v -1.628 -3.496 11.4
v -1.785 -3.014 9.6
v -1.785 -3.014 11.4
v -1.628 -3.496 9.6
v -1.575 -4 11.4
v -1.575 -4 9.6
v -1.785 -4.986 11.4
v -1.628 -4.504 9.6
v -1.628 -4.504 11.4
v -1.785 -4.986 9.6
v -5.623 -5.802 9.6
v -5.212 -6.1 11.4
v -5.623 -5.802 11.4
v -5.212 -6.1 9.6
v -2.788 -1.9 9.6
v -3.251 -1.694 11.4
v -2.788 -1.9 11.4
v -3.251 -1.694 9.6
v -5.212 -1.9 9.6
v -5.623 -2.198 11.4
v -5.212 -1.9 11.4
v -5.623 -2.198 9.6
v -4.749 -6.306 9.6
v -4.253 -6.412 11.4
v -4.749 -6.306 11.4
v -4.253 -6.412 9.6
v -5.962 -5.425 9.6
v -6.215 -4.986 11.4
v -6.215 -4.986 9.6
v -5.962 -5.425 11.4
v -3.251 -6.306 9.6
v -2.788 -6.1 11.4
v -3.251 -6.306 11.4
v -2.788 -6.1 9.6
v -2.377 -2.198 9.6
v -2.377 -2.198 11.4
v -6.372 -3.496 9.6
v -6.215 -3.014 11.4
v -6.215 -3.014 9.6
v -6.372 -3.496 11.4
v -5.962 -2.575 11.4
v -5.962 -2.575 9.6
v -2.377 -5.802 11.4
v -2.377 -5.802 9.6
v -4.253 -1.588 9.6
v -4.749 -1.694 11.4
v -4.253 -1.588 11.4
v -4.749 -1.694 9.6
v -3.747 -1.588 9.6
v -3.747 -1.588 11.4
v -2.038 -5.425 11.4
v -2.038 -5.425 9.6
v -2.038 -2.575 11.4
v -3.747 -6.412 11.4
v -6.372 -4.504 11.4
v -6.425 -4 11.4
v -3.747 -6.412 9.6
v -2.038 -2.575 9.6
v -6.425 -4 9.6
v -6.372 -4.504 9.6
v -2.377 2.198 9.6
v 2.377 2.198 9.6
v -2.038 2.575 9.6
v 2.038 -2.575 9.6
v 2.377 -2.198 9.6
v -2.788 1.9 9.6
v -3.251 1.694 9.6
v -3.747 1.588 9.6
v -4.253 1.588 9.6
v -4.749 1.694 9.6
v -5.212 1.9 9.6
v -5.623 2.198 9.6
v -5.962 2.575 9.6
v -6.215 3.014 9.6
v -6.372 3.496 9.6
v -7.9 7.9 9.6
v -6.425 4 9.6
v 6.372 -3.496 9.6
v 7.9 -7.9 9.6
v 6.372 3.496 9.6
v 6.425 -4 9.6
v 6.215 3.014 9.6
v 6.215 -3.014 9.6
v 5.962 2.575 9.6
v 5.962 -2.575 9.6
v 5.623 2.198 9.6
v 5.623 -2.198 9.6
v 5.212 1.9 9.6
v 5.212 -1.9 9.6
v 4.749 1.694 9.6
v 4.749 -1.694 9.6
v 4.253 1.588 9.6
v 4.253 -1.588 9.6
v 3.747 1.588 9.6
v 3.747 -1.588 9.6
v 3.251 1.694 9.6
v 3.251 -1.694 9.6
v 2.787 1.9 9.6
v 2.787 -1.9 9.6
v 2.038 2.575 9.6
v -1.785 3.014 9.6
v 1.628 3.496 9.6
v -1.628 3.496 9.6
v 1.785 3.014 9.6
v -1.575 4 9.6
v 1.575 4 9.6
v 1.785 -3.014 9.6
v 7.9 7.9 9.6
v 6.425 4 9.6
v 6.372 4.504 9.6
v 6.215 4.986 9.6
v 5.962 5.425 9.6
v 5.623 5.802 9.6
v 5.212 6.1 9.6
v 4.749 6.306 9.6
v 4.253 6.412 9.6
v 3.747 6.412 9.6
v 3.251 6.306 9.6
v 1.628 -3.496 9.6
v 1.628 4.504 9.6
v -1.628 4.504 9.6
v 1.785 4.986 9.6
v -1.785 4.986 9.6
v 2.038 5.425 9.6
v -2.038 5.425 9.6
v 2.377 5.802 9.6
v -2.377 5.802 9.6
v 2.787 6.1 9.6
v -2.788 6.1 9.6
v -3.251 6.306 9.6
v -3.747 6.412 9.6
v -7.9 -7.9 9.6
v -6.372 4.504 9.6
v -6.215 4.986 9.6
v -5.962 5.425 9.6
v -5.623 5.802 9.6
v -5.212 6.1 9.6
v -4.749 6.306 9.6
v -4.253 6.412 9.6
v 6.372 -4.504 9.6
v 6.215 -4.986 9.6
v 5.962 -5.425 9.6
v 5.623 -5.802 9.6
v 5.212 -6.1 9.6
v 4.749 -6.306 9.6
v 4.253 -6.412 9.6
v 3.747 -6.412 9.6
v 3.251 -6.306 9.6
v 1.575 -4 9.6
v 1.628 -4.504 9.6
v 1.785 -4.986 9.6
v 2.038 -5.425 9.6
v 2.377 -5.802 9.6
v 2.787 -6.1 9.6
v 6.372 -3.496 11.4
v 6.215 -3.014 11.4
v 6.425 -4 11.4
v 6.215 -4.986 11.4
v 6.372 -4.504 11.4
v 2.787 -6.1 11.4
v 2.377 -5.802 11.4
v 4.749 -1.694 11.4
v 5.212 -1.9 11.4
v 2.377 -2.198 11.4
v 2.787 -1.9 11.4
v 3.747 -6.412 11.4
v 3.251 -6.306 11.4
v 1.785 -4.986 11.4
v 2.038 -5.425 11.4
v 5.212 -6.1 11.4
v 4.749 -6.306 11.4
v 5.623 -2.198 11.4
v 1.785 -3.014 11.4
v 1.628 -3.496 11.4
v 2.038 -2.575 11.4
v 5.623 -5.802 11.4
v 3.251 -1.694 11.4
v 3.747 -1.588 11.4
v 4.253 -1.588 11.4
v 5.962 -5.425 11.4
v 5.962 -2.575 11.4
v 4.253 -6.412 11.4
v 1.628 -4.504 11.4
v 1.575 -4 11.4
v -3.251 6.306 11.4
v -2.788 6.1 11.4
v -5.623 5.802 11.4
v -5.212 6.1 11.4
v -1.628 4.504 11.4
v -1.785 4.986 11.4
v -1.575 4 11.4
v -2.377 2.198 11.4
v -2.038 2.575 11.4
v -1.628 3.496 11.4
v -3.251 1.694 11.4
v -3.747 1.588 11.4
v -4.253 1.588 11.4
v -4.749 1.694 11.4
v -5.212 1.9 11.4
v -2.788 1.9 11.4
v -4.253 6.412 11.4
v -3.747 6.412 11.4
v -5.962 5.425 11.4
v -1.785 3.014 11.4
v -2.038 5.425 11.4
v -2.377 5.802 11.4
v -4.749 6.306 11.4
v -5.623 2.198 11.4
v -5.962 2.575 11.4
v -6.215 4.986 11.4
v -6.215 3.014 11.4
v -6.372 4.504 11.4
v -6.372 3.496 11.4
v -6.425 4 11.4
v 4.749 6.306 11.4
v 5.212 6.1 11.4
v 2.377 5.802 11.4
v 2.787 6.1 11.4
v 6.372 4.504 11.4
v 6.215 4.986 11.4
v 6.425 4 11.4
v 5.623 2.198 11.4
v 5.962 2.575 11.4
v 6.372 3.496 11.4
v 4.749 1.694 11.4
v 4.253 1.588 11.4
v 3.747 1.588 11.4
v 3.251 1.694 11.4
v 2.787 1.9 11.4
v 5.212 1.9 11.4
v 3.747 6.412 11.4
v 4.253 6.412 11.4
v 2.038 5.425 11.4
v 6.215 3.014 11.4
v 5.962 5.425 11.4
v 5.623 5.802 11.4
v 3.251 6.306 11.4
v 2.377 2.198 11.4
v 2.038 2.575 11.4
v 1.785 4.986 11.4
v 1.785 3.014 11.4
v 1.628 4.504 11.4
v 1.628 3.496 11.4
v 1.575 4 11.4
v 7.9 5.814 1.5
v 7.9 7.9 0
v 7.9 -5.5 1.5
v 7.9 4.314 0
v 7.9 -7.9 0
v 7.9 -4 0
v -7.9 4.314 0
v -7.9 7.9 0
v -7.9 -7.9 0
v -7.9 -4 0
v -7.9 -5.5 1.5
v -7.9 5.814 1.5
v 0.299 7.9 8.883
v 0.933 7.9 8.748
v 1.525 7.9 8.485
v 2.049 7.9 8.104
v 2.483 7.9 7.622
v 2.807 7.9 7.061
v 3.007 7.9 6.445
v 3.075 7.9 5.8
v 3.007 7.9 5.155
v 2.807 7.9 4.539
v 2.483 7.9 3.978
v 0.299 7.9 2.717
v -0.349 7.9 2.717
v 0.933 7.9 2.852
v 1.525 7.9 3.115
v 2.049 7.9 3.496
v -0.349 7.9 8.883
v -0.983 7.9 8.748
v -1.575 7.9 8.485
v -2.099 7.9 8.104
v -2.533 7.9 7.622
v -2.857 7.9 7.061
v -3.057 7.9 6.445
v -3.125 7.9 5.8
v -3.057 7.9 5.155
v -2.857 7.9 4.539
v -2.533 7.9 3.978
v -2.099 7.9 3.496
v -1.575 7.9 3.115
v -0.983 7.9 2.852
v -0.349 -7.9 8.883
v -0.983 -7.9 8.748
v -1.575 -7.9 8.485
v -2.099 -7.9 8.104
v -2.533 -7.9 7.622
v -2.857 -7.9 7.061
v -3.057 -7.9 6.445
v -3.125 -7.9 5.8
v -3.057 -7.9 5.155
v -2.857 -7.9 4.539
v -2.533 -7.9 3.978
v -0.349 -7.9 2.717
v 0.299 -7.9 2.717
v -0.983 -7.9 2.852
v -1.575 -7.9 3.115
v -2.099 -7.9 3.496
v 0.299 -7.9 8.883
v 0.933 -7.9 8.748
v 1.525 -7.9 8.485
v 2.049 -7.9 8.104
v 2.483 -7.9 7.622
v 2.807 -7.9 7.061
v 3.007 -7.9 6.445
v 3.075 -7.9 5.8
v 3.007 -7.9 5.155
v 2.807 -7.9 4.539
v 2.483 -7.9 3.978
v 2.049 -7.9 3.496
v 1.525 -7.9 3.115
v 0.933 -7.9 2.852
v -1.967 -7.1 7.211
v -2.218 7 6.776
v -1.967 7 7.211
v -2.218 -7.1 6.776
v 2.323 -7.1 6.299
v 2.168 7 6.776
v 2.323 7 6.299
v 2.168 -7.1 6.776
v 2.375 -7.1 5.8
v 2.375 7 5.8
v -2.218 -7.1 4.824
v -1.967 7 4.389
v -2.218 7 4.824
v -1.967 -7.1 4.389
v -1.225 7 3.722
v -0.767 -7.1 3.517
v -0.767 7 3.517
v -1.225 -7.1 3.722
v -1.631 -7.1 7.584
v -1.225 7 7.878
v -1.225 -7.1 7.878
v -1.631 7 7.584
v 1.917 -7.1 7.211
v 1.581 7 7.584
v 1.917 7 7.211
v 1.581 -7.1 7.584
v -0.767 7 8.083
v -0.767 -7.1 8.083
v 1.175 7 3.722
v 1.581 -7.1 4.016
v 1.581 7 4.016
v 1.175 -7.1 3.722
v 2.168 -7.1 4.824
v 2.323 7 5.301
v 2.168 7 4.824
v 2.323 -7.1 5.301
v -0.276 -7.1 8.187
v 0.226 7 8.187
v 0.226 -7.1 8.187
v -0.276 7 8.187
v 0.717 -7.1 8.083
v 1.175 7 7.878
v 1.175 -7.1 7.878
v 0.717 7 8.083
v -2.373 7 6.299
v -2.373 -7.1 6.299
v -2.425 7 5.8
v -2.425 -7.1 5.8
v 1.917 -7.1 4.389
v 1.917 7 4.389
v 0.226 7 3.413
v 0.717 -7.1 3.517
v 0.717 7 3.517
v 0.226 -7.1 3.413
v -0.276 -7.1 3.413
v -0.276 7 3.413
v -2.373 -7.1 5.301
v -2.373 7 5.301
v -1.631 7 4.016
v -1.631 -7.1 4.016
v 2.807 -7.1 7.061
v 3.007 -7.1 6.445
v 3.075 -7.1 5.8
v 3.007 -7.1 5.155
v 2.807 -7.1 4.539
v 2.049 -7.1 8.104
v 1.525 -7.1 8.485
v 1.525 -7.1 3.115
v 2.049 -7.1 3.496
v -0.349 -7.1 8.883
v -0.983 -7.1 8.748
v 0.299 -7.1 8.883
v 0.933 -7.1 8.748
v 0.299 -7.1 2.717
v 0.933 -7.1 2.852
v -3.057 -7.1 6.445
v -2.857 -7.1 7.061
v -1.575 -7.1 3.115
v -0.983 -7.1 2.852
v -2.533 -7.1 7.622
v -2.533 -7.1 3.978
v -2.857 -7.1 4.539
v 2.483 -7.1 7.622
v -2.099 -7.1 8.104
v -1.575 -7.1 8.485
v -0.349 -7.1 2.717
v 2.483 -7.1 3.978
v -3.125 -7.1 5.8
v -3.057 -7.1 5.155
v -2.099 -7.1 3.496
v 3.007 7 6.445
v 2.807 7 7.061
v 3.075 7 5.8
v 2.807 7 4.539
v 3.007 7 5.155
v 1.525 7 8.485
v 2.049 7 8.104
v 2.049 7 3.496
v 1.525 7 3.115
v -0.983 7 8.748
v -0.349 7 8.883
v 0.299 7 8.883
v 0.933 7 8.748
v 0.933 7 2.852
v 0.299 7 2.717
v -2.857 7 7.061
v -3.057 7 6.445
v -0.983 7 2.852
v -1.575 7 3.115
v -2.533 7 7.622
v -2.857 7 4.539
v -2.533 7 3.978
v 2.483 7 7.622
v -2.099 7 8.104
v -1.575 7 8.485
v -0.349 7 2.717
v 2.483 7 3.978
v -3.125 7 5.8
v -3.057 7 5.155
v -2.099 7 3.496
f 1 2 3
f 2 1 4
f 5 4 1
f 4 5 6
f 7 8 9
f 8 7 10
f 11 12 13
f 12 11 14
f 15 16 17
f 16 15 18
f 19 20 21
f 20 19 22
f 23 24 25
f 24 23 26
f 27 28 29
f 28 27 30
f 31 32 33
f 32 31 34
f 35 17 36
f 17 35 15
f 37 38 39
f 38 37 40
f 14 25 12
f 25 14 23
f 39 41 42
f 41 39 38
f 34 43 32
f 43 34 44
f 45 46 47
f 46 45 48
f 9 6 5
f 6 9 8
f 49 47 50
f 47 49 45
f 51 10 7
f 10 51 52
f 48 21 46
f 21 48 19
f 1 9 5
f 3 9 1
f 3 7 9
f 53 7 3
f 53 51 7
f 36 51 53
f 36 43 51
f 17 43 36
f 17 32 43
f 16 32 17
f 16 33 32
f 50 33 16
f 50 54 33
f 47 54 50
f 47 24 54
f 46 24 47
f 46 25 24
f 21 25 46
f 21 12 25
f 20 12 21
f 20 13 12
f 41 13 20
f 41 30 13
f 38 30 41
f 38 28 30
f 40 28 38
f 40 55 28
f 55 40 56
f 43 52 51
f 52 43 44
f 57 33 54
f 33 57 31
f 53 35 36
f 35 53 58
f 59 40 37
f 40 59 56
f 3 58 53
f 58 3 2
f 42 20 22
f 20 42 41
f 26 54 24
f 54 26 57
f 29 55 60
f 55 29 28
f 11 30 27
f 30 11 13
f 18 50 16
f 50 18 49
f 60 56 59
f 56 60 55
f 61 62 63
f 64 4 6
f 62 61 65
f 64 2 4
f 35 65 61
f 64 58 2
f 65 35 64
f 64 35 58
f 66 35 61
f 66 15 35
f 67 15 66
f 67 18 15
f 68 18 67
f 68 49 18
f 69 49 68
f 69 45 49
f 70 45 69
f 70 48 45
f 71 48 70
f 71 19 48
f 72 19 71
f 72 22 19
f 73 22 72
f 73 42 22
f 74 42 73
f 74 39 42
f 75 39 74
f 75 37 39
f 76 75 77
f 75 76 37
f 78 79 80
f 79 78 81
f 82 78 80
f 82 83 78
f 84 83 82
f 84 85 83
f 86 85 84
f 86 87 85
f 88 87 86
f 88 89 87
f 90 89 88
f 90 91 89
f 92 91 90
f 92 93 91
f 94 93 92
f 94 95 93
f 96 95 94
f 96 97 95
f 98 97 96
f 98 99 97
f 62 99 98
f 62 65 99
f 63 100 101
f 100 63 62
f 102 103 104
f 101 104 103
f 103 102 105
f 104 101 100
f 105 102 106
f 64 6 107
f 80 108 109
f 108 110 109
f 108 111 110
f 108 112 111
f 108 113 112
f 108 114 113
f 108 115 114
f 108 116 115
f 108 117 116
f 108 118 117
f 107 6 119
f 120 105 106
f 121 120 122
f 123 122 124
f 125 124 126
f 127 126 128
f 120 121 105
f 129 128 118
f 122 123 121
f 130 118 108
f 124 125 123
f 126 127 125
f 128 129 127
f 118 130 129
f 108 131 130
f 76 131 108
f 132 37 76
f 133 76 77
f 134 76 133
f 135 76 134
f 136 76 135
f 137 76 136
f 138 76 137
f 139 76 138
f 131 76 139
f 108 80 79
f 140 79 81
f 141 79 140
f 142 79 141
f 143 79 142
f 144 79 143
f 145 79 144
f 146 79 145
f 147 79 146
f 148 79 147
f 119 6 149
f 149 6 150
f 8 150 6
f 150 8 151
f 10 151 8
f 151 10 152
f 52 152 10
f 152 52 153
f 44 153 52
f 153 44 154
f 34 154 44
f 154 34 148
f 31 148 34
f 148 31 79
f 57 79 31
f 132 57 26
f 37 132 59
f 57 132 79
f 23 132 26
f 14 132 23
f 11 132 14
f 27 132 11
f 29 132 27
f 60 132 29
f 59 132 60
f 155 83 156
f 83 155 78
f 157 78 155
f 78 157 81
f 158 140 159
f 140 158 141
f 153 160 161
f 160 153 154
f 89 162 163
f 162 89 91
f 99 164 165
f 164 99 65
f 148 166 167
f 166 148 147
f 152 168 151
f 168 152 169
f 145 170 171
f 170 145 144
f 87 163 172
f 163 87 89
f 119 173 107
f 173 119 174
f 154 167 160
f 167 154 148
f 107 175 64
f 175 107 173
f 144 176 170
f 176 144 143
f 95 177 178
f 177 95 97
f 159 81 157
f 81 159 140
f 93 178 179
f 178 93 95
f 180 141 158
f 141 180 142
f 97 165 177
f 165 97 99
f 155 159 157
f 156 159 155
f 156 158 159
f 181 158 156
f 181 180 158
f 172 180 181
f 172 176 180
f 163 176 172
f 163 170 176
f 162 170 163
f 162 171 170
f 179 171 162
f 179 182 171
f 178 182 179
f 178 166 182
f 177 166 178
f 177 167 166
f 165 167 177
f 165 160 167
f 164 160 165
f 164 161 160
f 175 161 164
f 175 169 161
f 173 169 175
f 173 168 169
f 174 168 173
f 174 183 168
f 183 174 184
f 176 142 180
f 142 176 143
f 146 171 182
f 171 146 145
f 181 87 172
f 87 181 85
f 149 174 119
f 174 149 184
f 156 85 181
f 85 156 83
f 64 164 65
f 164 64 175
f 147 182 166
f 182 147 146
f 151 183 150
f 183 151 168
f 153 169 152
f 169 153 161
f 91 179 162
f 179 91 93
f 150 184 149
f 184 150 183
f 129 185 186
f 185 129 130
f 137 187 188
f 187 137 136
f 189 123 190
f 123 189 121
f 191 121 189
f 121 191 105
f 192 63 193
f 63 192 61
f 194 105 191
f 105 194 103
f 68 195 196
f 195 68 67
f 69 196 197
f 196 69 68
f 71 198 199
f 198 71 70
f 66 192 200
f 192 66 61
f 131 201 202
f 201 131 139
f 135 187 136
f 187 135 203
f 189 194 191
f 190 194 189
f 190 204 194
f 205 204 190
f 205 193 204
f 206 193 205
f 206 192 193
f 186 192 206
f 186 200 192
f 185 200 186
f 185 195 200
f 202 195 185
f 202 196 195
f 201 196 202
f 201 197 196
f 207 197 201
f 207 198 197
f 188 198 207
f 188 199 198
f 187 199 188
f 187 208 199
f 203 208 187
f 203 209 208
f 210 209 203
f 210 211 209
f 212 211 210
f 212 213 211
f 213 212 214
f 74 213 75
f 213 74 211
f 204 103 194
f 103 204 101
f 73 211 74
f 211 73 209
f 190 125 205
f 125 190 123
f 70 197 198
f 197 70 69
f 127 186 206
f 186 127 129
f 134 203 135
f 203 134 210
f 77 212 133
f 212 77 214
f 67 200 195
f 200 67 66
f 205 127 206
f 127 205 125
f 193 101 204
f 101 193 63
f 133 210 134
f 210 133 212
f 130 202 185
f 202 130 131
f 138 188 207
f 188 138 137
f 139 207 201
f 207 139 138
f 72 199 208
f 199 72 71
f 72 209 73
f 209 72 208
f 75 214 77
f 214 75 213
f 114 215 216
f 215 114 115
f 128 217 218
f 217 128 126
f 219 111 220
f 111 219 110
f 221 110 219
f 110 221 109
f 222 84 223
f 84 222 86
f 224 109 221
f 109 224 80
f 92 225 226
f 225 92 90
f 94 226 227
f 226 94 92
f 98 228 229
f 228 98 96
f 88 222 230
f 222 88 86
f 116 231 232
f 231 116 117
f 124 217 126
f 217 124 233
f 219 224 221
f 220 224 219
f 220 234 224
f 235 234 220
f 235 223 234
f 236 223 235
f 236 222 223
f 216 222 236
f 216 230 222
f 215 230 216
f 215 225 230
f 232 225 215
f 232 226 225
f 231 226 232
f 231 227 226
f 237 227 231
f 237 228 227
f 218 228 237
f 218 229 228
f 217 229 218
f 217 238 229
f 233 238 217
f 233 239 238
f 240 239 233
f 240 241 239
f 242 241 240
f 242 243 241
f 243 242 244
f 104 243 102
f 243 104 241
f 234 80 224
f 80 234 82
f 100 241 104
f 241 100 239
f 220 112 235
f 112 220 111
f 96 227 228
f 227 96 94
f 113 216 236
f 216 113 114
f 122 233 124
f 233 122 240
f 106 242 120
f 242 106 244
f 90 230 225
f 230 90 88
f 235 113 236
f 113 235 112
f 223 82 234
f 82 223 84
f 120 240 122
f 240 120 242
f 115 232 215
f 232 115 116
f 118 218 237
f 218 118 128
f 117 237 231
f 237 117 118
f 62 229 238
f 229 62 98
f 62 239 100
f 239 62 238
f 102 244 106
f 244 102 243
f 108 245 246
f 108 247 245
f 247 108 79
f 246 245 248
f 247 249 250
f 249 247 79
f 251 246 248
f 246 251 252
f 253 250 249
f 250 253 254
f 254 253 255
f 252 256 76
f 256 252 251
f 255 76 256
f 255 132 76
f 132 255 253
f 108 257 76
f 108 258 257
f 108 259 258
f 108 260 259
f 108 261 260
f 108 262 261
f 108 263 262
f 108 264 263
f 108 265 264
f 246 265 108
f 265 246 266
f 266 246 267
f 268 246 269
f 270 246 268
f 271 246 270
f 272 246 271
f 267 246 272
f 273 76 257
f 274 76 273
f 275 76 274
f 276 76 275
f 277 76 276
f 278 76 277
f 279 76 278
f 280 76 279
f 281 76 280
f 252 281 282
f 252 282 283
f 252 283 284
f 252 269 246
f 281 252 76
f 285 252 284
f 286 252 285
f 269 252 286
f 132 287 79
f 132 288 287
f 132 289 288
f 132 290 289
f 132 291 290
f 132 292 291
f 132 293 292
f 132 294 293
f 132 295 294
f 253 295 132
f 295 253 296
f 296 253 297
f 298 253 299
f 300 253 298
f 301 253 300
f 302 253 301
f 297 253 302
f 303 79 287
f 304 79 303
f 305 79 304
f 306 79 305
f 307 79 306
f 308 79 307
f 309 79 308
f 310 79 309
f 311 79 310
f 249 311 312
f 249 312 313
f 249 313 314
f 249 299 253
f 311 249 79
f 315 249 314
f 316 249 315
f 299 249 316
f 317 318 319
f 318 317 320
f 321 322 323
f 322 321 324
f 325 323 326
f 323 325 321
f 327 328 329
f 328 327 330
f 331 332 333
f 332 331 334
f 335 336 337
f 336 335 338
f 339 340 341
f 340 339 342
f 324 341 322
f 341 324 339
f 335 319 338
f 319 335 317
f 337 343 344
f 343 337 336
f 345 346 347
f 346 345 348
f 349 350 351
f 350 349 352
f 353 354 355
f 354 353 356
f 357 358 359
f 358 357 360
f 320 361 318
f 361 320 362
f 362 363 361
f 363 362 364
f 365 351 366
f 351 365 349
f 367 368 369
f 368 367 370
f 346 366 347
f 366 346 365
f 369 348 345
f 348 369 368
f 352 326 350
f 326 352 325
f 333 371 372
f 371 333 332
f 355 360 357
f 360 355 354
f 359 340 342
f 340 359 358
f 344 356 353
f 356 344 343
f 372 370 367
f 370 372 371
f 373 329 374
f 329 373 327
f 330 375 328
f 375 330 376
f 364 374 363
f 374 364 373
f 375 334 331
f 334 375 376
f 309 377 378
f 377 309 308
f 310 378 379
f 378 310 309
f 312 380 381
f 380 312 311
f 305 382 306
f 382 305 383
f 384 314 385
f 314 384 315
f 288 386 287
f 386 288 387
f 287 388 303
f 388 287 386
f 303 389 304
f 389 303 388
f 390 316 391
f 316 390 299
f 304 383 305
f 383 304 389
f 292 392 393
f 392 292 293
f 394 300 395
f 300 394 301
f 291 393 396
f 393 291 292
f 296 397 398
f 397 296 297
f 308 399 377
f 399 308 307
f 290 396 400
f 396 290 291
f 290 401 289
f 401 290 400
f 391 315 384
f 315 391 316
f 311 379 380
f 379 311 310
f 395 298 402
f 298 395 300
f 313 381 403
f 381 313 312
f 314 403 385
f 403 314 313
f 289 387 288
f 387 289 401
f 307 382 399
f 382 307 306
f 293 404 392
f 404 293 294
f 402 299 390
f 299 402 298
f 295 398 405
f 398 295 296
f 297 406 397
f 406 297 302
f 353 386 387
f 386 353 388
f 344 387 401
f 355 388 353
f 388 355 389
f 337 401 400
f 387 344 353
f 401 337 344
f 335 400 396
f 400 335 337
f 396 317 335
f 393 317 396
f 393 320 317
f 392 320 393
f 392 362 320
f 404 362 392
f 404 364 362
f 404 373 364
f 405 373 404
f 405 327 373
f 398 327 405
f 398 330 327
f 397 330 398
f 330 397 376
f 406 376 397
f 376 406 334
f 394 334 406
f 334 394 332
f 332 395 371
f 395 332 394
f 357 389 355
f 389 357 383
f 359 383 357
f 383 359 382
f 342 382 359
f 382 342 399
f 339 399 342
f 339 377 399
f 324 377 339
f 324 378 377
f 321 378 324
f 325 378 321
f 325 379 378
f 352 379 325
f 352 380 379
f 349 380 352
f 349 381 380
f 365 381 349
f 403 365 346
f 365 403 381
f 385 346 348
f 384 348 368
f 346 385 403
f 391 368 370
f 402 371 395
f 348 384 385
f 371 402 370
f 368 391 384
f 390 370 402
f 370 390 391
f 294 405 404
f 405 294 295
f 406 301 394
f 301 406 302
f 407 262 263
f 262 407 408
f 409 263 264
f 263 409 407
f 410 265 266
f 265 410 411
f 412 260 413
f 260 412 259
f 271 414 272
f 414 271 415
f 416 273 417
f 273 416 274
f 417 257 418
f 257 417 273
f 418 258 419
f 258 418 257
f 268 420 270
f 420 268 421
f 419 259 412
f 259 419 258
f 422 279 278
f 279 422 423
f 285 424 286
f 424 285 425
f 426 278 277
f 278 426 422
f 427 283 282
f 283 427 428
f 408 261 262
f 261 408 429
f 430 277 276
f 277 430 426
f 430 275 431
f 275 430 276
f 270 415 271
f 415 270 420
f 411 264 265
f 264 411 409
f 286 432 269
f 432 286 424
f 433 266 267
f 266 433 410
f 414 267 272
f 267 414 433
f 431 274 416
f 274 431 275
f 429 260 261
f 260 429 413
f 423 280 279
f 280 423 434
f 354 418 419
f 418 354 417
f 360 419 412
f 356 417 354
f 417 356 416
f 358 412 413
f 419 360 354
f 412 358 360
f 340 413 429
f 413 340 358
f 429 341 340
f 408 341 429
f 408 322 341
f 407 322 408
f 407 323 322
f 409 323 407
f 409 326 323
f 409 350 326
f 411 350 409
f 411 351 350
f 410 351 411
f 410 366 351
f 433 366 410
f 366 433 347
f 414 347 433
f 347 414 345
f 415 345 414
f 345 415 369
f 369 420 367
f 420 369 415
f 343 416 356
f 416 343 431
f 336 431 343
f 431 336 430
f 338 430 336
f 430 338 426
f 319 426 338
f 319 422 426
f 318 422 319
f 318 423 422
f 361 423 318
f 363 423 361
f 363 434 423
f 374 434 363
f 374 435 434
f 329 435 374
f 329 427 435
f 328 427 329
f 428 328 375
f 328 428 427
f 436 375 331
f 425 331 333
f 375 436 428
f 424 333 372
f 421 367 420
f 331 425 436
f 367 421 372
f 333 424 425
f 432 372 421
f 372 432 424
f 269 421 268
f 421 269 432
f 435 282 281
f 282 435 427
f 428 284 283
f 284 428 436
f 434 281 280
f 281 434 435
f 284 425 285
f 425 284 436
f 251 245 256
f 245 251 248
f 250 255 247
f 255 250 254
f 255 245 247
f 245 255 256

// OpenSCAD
/**
 * Derived from http://www.thingiverse.com/thing:5699
 *
 * LEGO, the LEGO logo, the Brick, DUPLO, and MINDSTORMS are trademarks of the LEGO Group. 2012 The LEGO Group.
 *
 * Copyright (c) 2015 Christopher Finke
 *
 * Permission is hereby granted, free of charge, to any person obtaining
 * a copy of this software and associated documentation files (the
 * "Software"), to deal in the Software without restriction, including
 * without limitation the rights to use, copy, modify, merge, publish,
 * distribute, sublicense, and/or sell copies of the Software, and to
 * permit persons to whom the Software is furnished to do so, subject to
 * the following conditions:
 *
 * The above copyright notice and this permission notice shall be
 * included in all copies or substantial portions of the Software.
 *
 * THE SOFTWARE IS PROVIDED "AS IS", WITHOUT WARRANTY OF ANY KIND,
 * EXPRESS OR IMPLIED, INCLUDING BUT NOT LIMITED TO THE WARRANTIES OF
 * MERCHANTABILITY, FITNESS FOR A PARTICULAR PURPOSE AND
 * NONINFRINGEMENT. IN NO EVENT SHALL THE AUTHORS OR COPYRIGHT HOLDERS BE
 * LIABLE FOR ANY CLAIM, DAMAGES OR OTHER LIABILITY, WHETHER IN AN ACTION
 * OF CONTRACT, TORT OR OTHERWISE, ARISING FROM, OUT OF OR IN CONNECTION
 * WITH THE SOFTWARE OR THE USE OR OTHER DEALINGS IN THE SOFTWARE.
 */

/* [General] */

// Width of the block, in studs
block_width = 2;

// Length of the block, in studs
block_length = 2;

// Height of the block. A ratio of "1" is a standard LEGO brick height; a ratio of "1/3" is a standard LEGO plate height; "1/2" is a standard DUPLO plate.
block_height_ratio = 1; // [.33333333333:1/3, .5:1/2, 1:1, 1.5:1 1/2, 2:2, 3:3, 4:4, 5:5, 6:6, 7:7, 8:8, 9:9, 10:10]

// What type of block should this be? For type-specific options, see the "Wings," "Slopes," "Curves", and "Baseplates" tabs.
block_type = "brick"; // [brick:Brick, tile:Tile, wing:Wing, slope:Slope, curve:Curve, baseplate:Baseplate, round:Round]

// What brand of block should this be? LEGO for regular LEGO bricks, Duplo for the toddler-focused larger bricks.
block_brand = "lego"; // [lego:LEGO, duplo:DUPLO]

// What stud type do you want? Hollow studs allow rods to be pushed into the stud.
stud_type = "solid"; // [solid:Solid, hollow:Hollow]

// What type of block bottom do you want? Open blocks are the standard, closed bottom blocks can be used for stacking composite shapes.
block_bottom_type = "closed"; // [closed:Closed, open:Open]

// Should the block wall include splines? Valid only for a open block bottom type.
include_wall_splines = "yes"; // [no:No, yes:Yes]

// Should the block include round horizontal holes like the Technics LEGO bricks have?
technic_holes = "yes"; // [no:No, yes:Yes]

// Should the block include vertical cross-shaped axle holes?
vertical_axle_holes = "no"; // [no:No, yes:Yes]

// Create bottom posts, or not. No posts at the bottom adds space for custom content.
with_posts = true;

/* [Wings] */

// What type of wing? Full is suitable for the front of a plane, left/right are for the left/right of a plane.
wing_type = "full"; // [full:Full, left:Left, right:Right]

// The number of studs across the end of the wing. If block_width is odd, this needs to be odd, and the same for even.
wing_end_width = 2;

// The length of the rectangular portion of the wing, in studs.
wing_base_length = 3;

// Should the wing edges be notched to accept studs below?
wing_stud_notches = "yes"; // [yes:Yes, no:No]

/* [Slopes] */

// How many rows of studs should be left before the slope?
slope_stud_rows = 1;

// How much vertical height should be left at the end of the slope? e.g, a value of zero means the slope reaches the bottom of the block. A value of 1 means that for a block with height 2, the slope reaches halfway down the block.
slope_end_height = 0;

/* [Curves] */

// How many rows of studs should be left before the curve?
curve_stud_rows = 5;

// Should the curve be convex or concave?
curve_type = "concave"; // [concave:Concave, convex:Convex]

// How much vertical height should be left at the end of the curve? e.g, a value of zero means the curve reaches the bottom of the block. A value of 1 means that for a block with height 2, the curve reaches halfway down the block.
curve_end_height = 0;

/* [Baseplates] */

// If you want a roadway, how wide should it be (in studs)? A roadway is a smooth (non-studded) section of a baseplate.
roadway_width = 0;

// How long should the roadway be?
roadway_length = 0;

// Where should the roadway start (x-value)? A value of zero puts the roadway at the far left side of the plate.
roadway_x = 0;

// Where should the roadway start (y-value)? A value of zero puts the roadway at the front of the plate.
roadway_y = 0;

// Should the road be inverted? Useful for minifigure display with one row of studs on the middle.
roadway_invert = false; // [false:False, true:True]

/* [Round] */

// How many studs should be rounded at the corners?
round_radius = 3;

// Should the rounded edges be notched to accept studs below?
round_stud_notches = "yes";

/* [SNOT] */

// SNOT means Studs Not On Top -- bricks with alternative stud configurations.
// Put studs on the top and bottom?
dual_sided = "no"; // [no:No, yes:Yes]

// Instead of both sides having studs, both sides can have no studs.
dual_bottom = "no"; // [no:No, yes:Yes]

/* [Printer-Specific] */

// Should extra reinforcement be included to make printing on an FDM printer easier? Ignored for tiles, since they're printed upside-down and don't need the reinforcement. Recommended for block heights less than 1 or for Duplo bricks. 
use_reinforcement = "no"; // [no:No, yes:Yes]

// If your printer prints the blocks correctly except for the stud diameter, use this variable to resize just the studs for your printer. A value of 1.05 will print the studs 105% wider than standard.
stud_rescale = 1.00; // [0.51:0.01:1.49]
//stud_rescale = 1.03 * 1;  // Creality Ender 3 Pro, PLA
//stud_rescale = 1.0475 * 1; // Orion Delta, T-Glase
//stud_rescale = 1.022 * 1; // Orion Delta, ABS

// If you want stud tops to be curved, specify a value between 0 and 1, where 0 is no roundness and 1 is very round
stud_top_roundness = 0; // [0:0.01:1]

// Print tiles upside down.
difference() {
translate([0, 0, (block_type == "tile" ? block_height_ratio * block_height : 0)]) rotate([0, (block_type == "tile" ? 180 : 0), 0]) {
    block(
        width=block_width,
        length=block_length,
        height=block_height_ratio,
        type=block_type,
        brand=block_brand,
        stud_type=stud_type,
        block_bottom_type=block_bottom_type,
        include_wall_splines=(include_wall_splines=="yes"),
        horizontal_holes=(technic_holes=="yes"),
        vertical_axle_holes=(vertical_axle_holes=="yes"),
        reinforcement=(use_reinforcement=="yes"),
        wing_type=wing_type,
        wing_end_width=wing_end_width,
        wing_base_length=wing_base_length,
        stud_notches=(wing_stud_notches=="yes" || round_stud_notches=="yes"),
        slope_stud_rows=slope_stud_rows,
        slope_end_height=slope_end_height,
        curve_stud_rows=curve_stud_rows,
        curve_type=curve_type,
        curve_end_height=curve_end_height,
        roadway_width=roadway_width,
        roadway_length=roadway_length,
        roadway_x=roadway_x,
        roadway_y=roadway_y,
        roadway_invert=roadway_invert,
        round_radius=round_radius,
        stud_rescale=stud_rescale,
        stud_top_roundness=stud_top_roundness,
        dual_sided=(dual_sided=="yes"),
        dual_bottom=(dual_bottom=="yes"),
        with_posts=with_posts
    );
   }
translate([-10, -5.5, 1.5]){
 rotate([0,90,0]){
 rotate([0,0,45]){
  difference(){
    //creating a cube
    cube([8, 8, 20]);
    //rotating the cube
    translate([0, 0, -0.2]){
    rotate([0, 0, 45]){
        cube([20, 20, 21]);
      }
     }
    }
   }
  }
 } 
} // difference

module block(
    width=1,
    length=2,
    height=1,
    type="brick",
    brand="lego",
    stud_type="solid",
    block_bottom_type="open",
    include_wall_splines=true,
    horizontal_holes=false,
    vertical_axle_holes=false,
    reinforcement=false,
    wing_type="full",
    wing_end_width=2,
    wing_base_length=2,
    stud_notches=false,
    slope_stud_rows=1,
    slope_end_height=0,
    curve_stud_rows=1,
    curve_type="concave",
    curve_end_height=0,
    roadway_width=0,
    roadway_length=0,
    roadway_x=0,
    roadway_y=0,
    roadway_invert=false,
    round_radius=0,
    stud_rescale=1,
    stud_top_roundness=0,
    dual_sided=false,
    dual_bottom=false,
    with_posts=true
    ) {
    post_wall_thickness = (brand == "lego" ? 0.85 : 1);
    wall_thickness=(brand == "lego" ? 1.45 : 1.5);
    stud_diameter=(brand == "lego" ? 4.85 : 9.40);
    hollow_stud_inner_diameter = (brand == "lego" ? 3.1 : 6.7);
    stud_height=(brand == "lego" ? 1.8 : 4.4);
    stud_spacing=(brand == "lego" ? 8 : 8 * 2);
    block_height=compute_block_height(type, brand);
    pin_diameter=(brand == "lego" ? 3 : 3 * 2);
    post_diameter=(brand == "lego" ? 6.5 : 13.2);
    cylinder_precision=(brand == "lego" ? 0.1 : 0.05);
    reinforcing_width = (brand == "lego" ? 0.7 : 1);

    real_include_wall_splines = block_bottom_type == "open" && include_wall_splines;
    spline_length = (brand == "lego" ? 0.25 : 1.7);
    spline_thickness = (brand == "lego" ? 0.7 : 1.3);

    horizontal_hole_diameter = (brand == "lego" ? 4.8 : 4.8 * 2);
    horizontal_hole_z_offset = (brand == "lego" ? 5.8 : 5.8 * 2);
    horizontal_hole_bevel_diameter = (brand == "lego" ? 6.2 : 6.2 * 2);
    horizontal_hole_bevel_depth = (brand == "lego" ? 0.9 : 0.9 * 1.5 / 1.2 );

    roof_thickness = (type == "baseplate" || dual_sided ? block_height * height : 1 * 1);

    // Duplo axle dimensions are based on "Early Simple Machines Set 9656"
    axle_spline_width = (brand == "lego" ? 2.0 : 3.10);
    axle_diameter = (brand == "lego" ? 5 * 1 : 7.25);

    // Brand-independent measurements.
    wall_play = 0.1 * 1;
    horizontal_hole_wall_thickness = 1 * 1;

    // Ensure that width is always less than or equal to length.
    real_width = ((type == "wing" || type == "slope") ? width : min(width, length) );
    real_length = ((type == "wing" || type == "slope")  ? length : max(width, length) );
    real_height = compute_real_height(type, height);

    // Ensure that the wing end width is even if the width is even, odd if odd, and a reasonable value.
    real_wing_end_width = (wing_type == "full"
        ?
        min(real_width - 2, ((real_width % 2 == 0) ? 
            (max(2, (
                wing_end_width % 2 == 0 ?
                (wing_end_width)
                :
                (wing_end_width-1)
            )))
            :
            (max(1, (
                wing_end_width % 2 == 0 ?
                (wing_end_width-1)
                :
                (wing_end_width)
            )))
        ))
        :
        (min(real_width-1, max(1, wing_end_width))) // Half-wing
    );

    // Ensure that the base length is a reasonable value.
    real_wing_base_length = min(real_length-1, max(1, wing_base_length)) + 1; // +1 because the angle starts before the last stud.
        
    // Validate all the rest of the arguments.
    real_slope_end_height = max(0, min(real_height - 1/3, slope_end_height));
    real_slope_stud_rows = min(real_length - 1, slope_stud_rows);
    real_curve_stud_rows = max(0, curve_stud_rows);
    real_curve_type = (curve_type == "convex" ? "convex" : "concave");
    real_curve_end_height = max(0, min(real_height - 1/3, curve_end_height));
    real_horizontal_holes = horizontal_holes && ((type == "baseplate" && real_height >= 8) || real_height >= 1) && !dual_sided;
    real_vertical_axle_holes = vertical_axle_holes && real_width > 1;
    real_reinforcement = reinforcement && type != "baseplate" && type != "tile" && !dual_sided;

    real_roadway_width = max(0, min(roadway_width, real_width));
    real_roadway_length = max(0, min(roadway_length, real_length));
    real_roadway_x = max(0, min(real_length - real_roadway_length, roadway_x));
    real_roadway_y = max(0, min(real_width - real_roadway_width, roadway_y));

    real_stud_notches = stud_notches && !dual_sided;
    real_dual_sided = dual_sided && type != "curve" && type != "slope" && type != "tile";
    real_dual_bottom = dual_bottom && !real_dual_sided && type != "curve" && type != "slope";

    total_studs_width = (stud_diameter * stud_rescale * real_width) + ((real_width - 1) * (stud_spacing - (stud_diameter * stud_rescale)));
    total_studs_length = (stud_diameter * stud_rescale * real_length) + ((real_length - 1) * (stud_spacing - (stud_diameter * stud_rescale)));

    total_posts_width = (post_diameter * (real_width - 1)) + ((real_width - 2) * (stud_spacing - post_diameter));
    total_posts_length = (post_diameter * (real_length - 1)) + ((real_length - 2) * (stud_spacing - post_diameter));

    total_axles_width = (axle_diameter * (real_width - 1)) + ((real_width - 2) * (stud_spacing - axle_diameter));
    total_axles_length = (axle_diameter * (real_length - 1)) + ((real_length - 2) * (stud_spacing - axle_diameter));

    total_pins_width = (pin_diameter * (real_width - 1)) + max(0, ((real_width - 2) * (stud_spacing - pin_diameter)));
    total_pins_length = (pin_diameter * (real_length - 1)) + max(0, ((real_length - 2) * (stud_spacing - pin_diameter)));

    overall_length = (real_length * stud_spacing) - (2 * wall_play);
    overall_width = (real_width * stud_spacing) - (2 * wall_play);

    wing_slope = (wing_type == "full" ?
        ((real_width - (real_wing_end_width + 1)) / 2) / (real_length - (real_wing_base_length - 1))
        :
        (real_width - (real_wing_end_width)) / (real_length - (real_wing_base_length - 1))
    );
    
    // trying to round the corners more then the width of the results in broken geometry
    // TODO allow setting each corner's rounding radius?
    max_round = min(real_width, real_length) / 2;
    real_rounding = round_radius > 0 ? min(max_round,round_radius) : max_round;
    round_distance = real_rounding * stud_spacing;

    translate([-overall_length/2, -overall_width/2, 0]) // Comment to position at 0,0,0 instead of centered on X and Y.
        union() {
            difference() {
                union() {
                    /**
                     * Include any union()s that should come before the final difference()s.
                     */
                    
                    // The mass of the block.
                    difference() {
                        cube([overall_length, overall_width, real_height * block_height]);
                        if (block_bottom_type == "open") {
                          translate([wall_thickness,wall_thickness,-roof_thickness]) cube([overall_length-wall_thickness*2,overall_width-wall_thickness*2,block_height*real_height]);
                        }
                    }

                    // The studs on top of the block (if it's not a tile).
                    if ( type != "tile" && !real_dual_bottom ) {
                        translate([stud_diameter * stud_rescale / 2, stud_diameter * stud_rescale / 2, 0]) 
                        translate([(overall_length - total_studs_length)/2, (overall_width - total_studs_width)/2, 0]) {
                            for (ycount=[0:real_width-1]) {
                                for (xcount=[0:real_length-1]) {
                                    if (!skip_this_stud(xcount, ycount)) {
                                        translate([xcount*stud_spacing,ycount*stud_spacing,block_height*real_height]) stud();
                                    }
                                }
                            }
                       }
                    }

                    // Interior splines to catch the studs.
                    if (real_include_wall_splines) {
                      translate([stud_spacing / 2 - wall_play - (spline_thickness/2), 0, 0]) for (xcount = [0:real_length-1]) {
                          translate([0,wall_thickness,0]) translate([xcount * stud_spacing, 0, 0]) cube([spline_thickness, spline_length, real_height * block_height]);
                          translate([xcount * stud_spacing, overall_width - wall_thickness -  spline_length, 0]) cube([spline_thickness, spline_length, real_height * block_height]);
                      }

                      translate([0, stud_spacing / 2 - wall_play - (spline_thickness/2), 0]) for (ycount = [0:real_width-1]) {
                          translate([wall_thickness,0,0]) translate([0, ycount * stud_spacing, 0]) cube([spline_length, spline_thickness, real_height * block_height]);
                          translate([overall_length - wall_thickness -  spline_length, ycount * stud_spacing, 0]) cube([spline_length, spline_thickness, real_height * block_height]);
                      }
                    }

                    if (type != "baseplate" && block_bottom_type == "open" && real_width > 1 && real_length > 1 && !real_dual_sided && roof_thickness < block_height * height) {
                        // Reinforcements and posts
                        translate([post_diameter / 2, post_diameter / 2, 0]) {
                            translate([(overall_length - total_posts_length)/2, (overall_width - total_posts_width)/2, 0]) {
                                union() {
                                    // Posts
                                    if(with_posts) {
                                        for (ycount=[1:real_width-1]) {
                                            for (xcount=[1:real_length-1]) {
                                                translate([(xcount-1)*stud_spacing,(ycount-1)*stud_spacing,0]) post(real_vertical_axle_holes && !skip_this_vertical_axle_hole(xcount, ycount));
                                            }
                                        }
                                    }

                                    // Reinforcements
                                    if (real_reinforcement) {
                                        difference() {
                                            for (ycount=[1:real_width-1]) {
                                                for (xcount=[1:real_length-1]) {
                                                    translate([(xcount-1)*stud_spacing,(ycount-1)*stud_spacing,0]) reinforcement();
                                                }
                                            }

                                            for (ycount=[1:real_width-1]) {
                                                for (xcount=[1:real_length-1]) {
                                                    translate([(xcount-1)*stud_spacing,(ycount-1)*stud_spacing,-0.5]) cylinder(r=post_diameter/2-0.1, h=real_height*block_height+0.5, $fs=cylinder_precision);
                                                }
                                            }
                                        }
                                    }
                                }
                            }
                        }
                    }

                    if (type != "baseplate" && block_bottom_type == "open" && (real_width == 1 || real_length == 1) && real_width != real_length && !real_dual_sided && roof_thickness < block_height * height) {
                        // Pins
                        if (real_width == 1) {
                            translate([(pin_diameter/2) + (overall_length - total_pins_length) / 2, overall_width/2, 0]) {
                                for (xcount=[1:real_length-1]) {
                                    translate([(xcount-1)*stud_spacing,0,0]) cylinder(r=pin_diameter/2,h=block_height*real_height,$fs=cylinder_precision);
                                }
                            }
                        }
                        else {
                            translate([overall_length/2, (pin_diameter/2) + (overall_width - total_pins_width) / 2, 0]) {
                                for (ycount=[1:real_width-1]) {
                                    translate([0,(ycount-1)*stud_spacing,0]) cylinder(r=pin_diameter/2,h=block_height*real_height,$fs=cylinder_precision);
                                }
                            }
                        }
                    }

                    if (real_horizontal_holes) {
                        // The holes for the horizontal axles.
                        // 1-length bricks have the hole underneath the stud.
                        // >1-length bricks have the holes between the studs.
                        for (height_index = [0 : height - 1]) {
                            translate([horizontal_holes_x_offset(), overall_width, height_index * block_height]) 
                            translate([(overall_length - total_studs_length)/2, 0, 0]) {
                            for (axle_hole_index=[horizontal_hole_start_index() : horizontal_hole_end_index()]) {
                                if (!skip_this_horizontal_hole(axle_hole_index, height_index)) {
                                        translate([axle_hole_index*stud_spacing,0,horizontal_hole_z_offset]) rotate([90, 0, 0])  cylinder(r=horizontal_hole_diameter/2 + horizontal_hole_wall_thickness, h=overall_width,$fs=cylinder_precision);
                                    }
                                }
                            }
                        }
                    }
                }

                
                /**
                 * Include any differences from the basic brick here.
                 */
                
                if (real_vertical_axle_holes) {
                    if (real_width > 1 && real_length > 1) {
                        translate([axle_diameter / 2, axle_diameter / 2, 0]) {
                            translate([(overall_length - total_axles_length)/2, (overall_width - total_axles_width)/2, 0]) {
                                for (ycount = [ 1 : real_width - 1 ]) {
                                    for (xcount = [ 1 : real_length - 1]) {
                                        if (!skip_this_vertical_axle_hole(xcount, ycount)) {
                                            translate([(xcount-1)*stud_spacing,(ycount-1)*stud_spacing,-block_height/2]) axle();
                                        }
                                    }
                                }
                            }
                        }
                    }
                }

                if (type == "wing") {
                    if (wing_type == "full" || wing_type == "right")  {
                        translate([0, 0, -0.5]) linear_extrude(block_height * real_height + stud_height + 1) polygon(points=[
                            [stud_spacing * (real_wing_base_length-1), -0.01],
                            [overall_length + 0.01, -0.01],
                            [overall_length + 0.01, (wing_type == "full" ?
                                (overall_width / 2 - (real_wing_end_width * stud_spacing / 2))
                                :
                                (overall_width - (real_wing_end_width * stud_spacing))
                            )]
                        ]
                        );
                    }
                    if (wing_type == "full" || wing_type == "left")  {
                        translate([0, 0, -0.5]) linear_extrude(block_height * real_height + stud_height + 1) polygon(points=[
                            [stud_spacing * (real_wing_base_length-1), overall_width + 0.01],
                            [overall_length + 0.01, overall_width + 0.01],
                            [overall_length + 0.01, (wing_type == "full" ? overall_width / 2 : 0) + (real_wing_end_width * stud_spacing / (wing_type == "full" ? 2 : 1))]
                        ]
                        );


                    }
                }
                else if (type == "slope") {
                    translate([0, overall_width+0.5, 0]) rotate([90, 0, 0]) linear_extrude(overall_width+1) polygon(points=[
                        [-0.1, (block_height * real_slope_end_height) + stud_height],
                        [min(overall_length, overall_length - (stud_spacing * real_slope_stud_rows) + (wall_play/2)), real_height * block_height - roof_thickness],
                        [min(overall_length, overall_length - (stud_spacing * real_slope_stud_rows) + (wall_play/2)), real_height * block_height + stud_height + 1],
                        [-0.1, real_height * block_height + stud_height + 1]
                    ]);
                }
                else if (type == "curve") {
                    if (real_curve_type == "concave") {
                        difference() {
                            translate([
                                    -curve_circle_length() / 2, // Align the center of the cube with the end of the block.
                                    -0.5, // Center the extra width on the block.
                                    (real_height * block_height) - (curve_circle_height() / 2)  // Align the bottom of the cube with the center of the curve circle.
                                ])
                                cube([curve_circle_length(), overall_width + 1, curve_circle_height()]);

                            translate([
                                    curve_circle_length() / 2,  // Align the end of the curve with the end of the block.
                                    overall_width / 2, // Center it on the block.
                                    (real_height * block_height) - (curve_circle_height() / 2)  // Align the top of the curve with the top of the block.
                                ])
                                rotate([90, 0, 0]) // Rotate sideways
                                translate([0, 0, -overall_width/2]) // Move so the cylinder is z-centered.
                                resize([curve_circle_length(), curve_circle_height(), 0]) // Resize to the approprate scale.
                                cylinder(r=real_height * block_height, h=overall_width, $fs=cylinder_precision);
                        }
                    }
                    else if (real_curve_type == "convex") {
                        union() {
                            translate([0, 0, real_height * block_height]) cube([overall_length - (real_curve_stud_rows * stud_spacing), overall_width, stud_height + .1]);
                            translate([0, 0, block_height * real_height])
                                translate([0, (overall_width+1)/2-.5, 0]) // Center across the end of the block.
                                rotate([90, 0, 0])
                                translate([0, 0, -((overall_width+1)/2)]) // z-center
                                resize([curve_circle_length(), curve_circle_height(), 0]) // Resize to the final dimensions.
                                cylinder(r=block_height * real_height, h=overall_width+1, $fs=cylinder_precision);
                        }
                    }
                }
                else if (type == "baseplate") {
                    // Rounded corners.
                    union() {
                        translate([overall_length, overall_width, 0]) translate([-((stud_spacing / 2) - wall_play), -((stud_spacing / 2) - wall_play), 0]) negative_rounded_corner(r=((stud_spacing / 2) - wall_play), h=real_height * block_height);
                        
                        translate([0, overall_width, 0]) translate([((stud_spacing / 2) - wall_play), -((stud_spacing / 2) - wall_play), 0]) rotate([0, 0, 90]) negative_rounded_corner(r=((stud_spacing / 2) - wall_play), h=real_height * block_height);
                        translate([((stud_spacing / 2) - wall_play), ((stud_spacing / 2) - wall_play), 0]) rotate([0, 0, 180]) negative_rounded_corner(r=((stud_spacing / 2) - wall_play), h=real_height * block_height);
                        translate([overall_length, 0, 0]) translate([-((stud_spacing / 2) - wall_play), ((stud_spacing / 2) - wall_play), 0]) rotate([0, 0, 270]) negative_rounded_corner(r=((stud_spacing / 2) - wall_play), h=real_height * block_height);
                    }
                }
                else if (type == "round") {
                    // Rounded corners.
                    union() {
                        translate([overall_length, overall_width, 0]) translate([-((round_distance) - wall_play), -((round_distance) - wall_play), -.499])                     negative_rounded_corner(r=((round_distance) - wall_play), h=real_height * block_height, inside=true);
                        translate([0, overall_width, 0])              translate([ ((round_distance) - wall_play), -((round_distance) - wall_play), -.499]) rotate([0, 0, 90 ]) negative_rounded_corner(r=((round_distance) - wall_play), h=real_height * block_height, inside=true);
                                                                      translate([ ((round_distance) - wall_play),  ((round_distance) - wall_play), -.499]) rotate([0, 0, 180]) negative_rounded_corner(r=((round_distance) - wall_play), h=real_height * block_height, inside=true);
                        translate([overall_length, 0, 0])             translate([-((round_distance) - wall_play),  ((round_distance) - wall_play), -.499]) rotate([0, 0, 270]) negative_rounded_corner(r=((round_distance) - wall_play), h=real_height * block_height, inside=true);
                    }
                }

                if (real_horizontal_holes) {
                    // The holes for the horizontal axles.
                    // 1-length bricks have the hole underneath the stud.
                    // >1-length bricks have the holes between the studs.
                    for (height_index = [0 : height - 1]) {
                        translate([horizontal_holes_x_offset(), 0, height_index * block_height]) 
                        translate([(overall_length - total_studs_length)/2, 0, 0]) {
                            for (axle_hole_index=[horizontal_hole_start_index() : horizontal_hole_end_index()]) {
                                if (!skip_this_horizontal_hole(axle_hole_index, height_index)) {
                                    union() {
                                        translate([axle_hole_index*stud_spacing,overall_width,horizontal_hole_z_offset]) rotate([90, 0, 0])  cylinder(r=horizontal_hole_diameter/2, h=overall_width,$fs=cylinder_precision);
    
                                        // Bevels. The +/- 0.1 measurements are here just for nicer previews in OpenSCAD, and could be removed.
                                        translate([axle_hole_index*stud_spacing,horizontal_hole_bevel_depth-0.1,horizontal_hole_z_offset]) rotate([90, 0, 0]) cylinder(r=horizontal_hole_bevel_diameter/2, h=horizontal_hole_bevel_depth+0.1,$fs=cylinder_precision);
                                        translate([axle_hole_index*stud_spacing,overall_width+0.1,horizontal_hole_z_offset]) rotate([90, 0, 0]) cylinder(r=horizontal_hole_bevel_diameter/2, h=horizontal_hole_bevel_depth+0.1,$fs=cylinder_precision);
                                    }
                                }
                            }
                        }
                    }
                }
            }

            
            /**
             * Any final union()s for the brick.
             */
            
            if (type == "wing") {
                difference() {
                    union() {
                        if ( wing_type == "full" || wing_type == "right" ){
                            linear_extrude(block_height * real_height) polygon(points=[
                                [stud_spacing * (real_wing_base_length-1), 0],
                                [overall_length, (wing_type == "full" ? 
                                    ((overall_width / 2) - (real_wing_end_width * stud_spacing / 2))
                                    :
                                    (overall_width - (real_wing_end_width * stud_spacing))
                                )],
                                [overall_length, (wing_type == "full" ? 
                                    ((overall_width / 2) - (real_wing_end_width * stud_spacing / 2))
                                    :
                                    (overall_width - (real_wing_end_width * stud_spacing))
                                ) + wall_thickness],
                                [stud_spacing * (real_wing_base_length-1), wall_thickness]
                            ]);
                        }

                        if (wing_type == "full" || wing_type == "left") {
                            linear_extrude(block_height * real_height) polygon(points=[
                                [stud_spacing * (real_wing_base_length-1), overall_width],
                                [overall_length, (wing_type == "full" ? overall_width / 2 : 0) + (real_wing_end_width * stud_spacing / (wing_type == "full" ? 2 : 1))],
                                [overall_length, (wing_type == "full" ? overall_width / 2 : 0) + (real_wing_end_width * stud_spacing / (wing_type == "full" ? 2 : 1)) - wall_thickness],
                                [stud_spacing * (real_wing_base_length-1), overall_width - wall_thickness]
                            ]);
                        }
                    }

                    if (real_stud_notches) {subtract_stud_notches();}
                }
            }
            else if (type == "slope") {
                translate([0, overall_width, 0]) rotate([90, 0, 0]) linear_extrude(overall_width) polygon(points=[
                    [0, (block_height * real_slope_end_height) + stud_height],
                    [0, (block_height * real_slope_end_height) + stud_height + roof_thickness],
                    [min(overall_length, overall_length - (stud_spacing * real_slope_stud_rows) + (wall_play/2)), real_height * block_height],
                    [min(overall_length, overall_length - (stud_spacing * real_slope_stud_rows) + (wall_play/2)), (real_height * block_height) - roof_thickness]
                ]);
            }
            else if (type == "curve") {
                if (real_curve_type == "concave") {
                    intersection() {
                        translate([
                                -curve_circle_length() / 2, // Align the center of the cube with the end of the block.
                                -0.5, // Center the extra width on the block.
                                (real_height * block_height) - (curve_circle_height() / 2)  // Align the bottom of the cube with the center of the curve circle.
                            ])
                            cube([curve_circle_length(), overall_width + 1, curve_circle_height()]);

                        difference() {   
                            translate([
                                    curve_circle_length() / 2,  // Align the end of the curve with the end of the block.
                                    overall_width / 2, // Center it on the block.
                                    (real_height * block_height) - (curve_circle_height() / 2)  // Align the top of the curve with the top of the block.
                                ])
                                rotate([90, 0, 0]) // Rotate sideways
                                translate([0, 0, -overall_width/2]) // Move so the cylinder is z-centered.
                                resize([curve_circle_length(), curve_circle_height(), 0]) // Resize to the approprate scale.
                                cylinder(r=real_height * block_height, h=overall_width, $fs=cylinder_precision);

                            translate([
                                    curve_circle_length() / 2,  // Align the end of the curve with the end of the block.
                                    overall_width / 2, // Center it on the block.
                                    (real_height * block_height) - (curve_circle_height() / 2) // Align the top of the curve with the top of the block.
                                ])
                                rotate([90, 0, 0]) // Rotate sideways
                                translate([0, 0, -overall_width/2]) // Move so the cylinder is z-centered.
                                resize([curve_circle_length() - (wall_thickness * 2), curve_circle_height() - (wall_thickness * 2), 0]) // Resize to the approprate scale.
                                cylinder(r=real_height * block_height, h=overall_width, $fs=cylinder_precision);
                        }
                    }
                }
                else if (real_curve_type == "convex") {
                    intersection() {
                        translate([
                            0,
                            0,
                            (real_height * block_height) - (curve_circle_height() / 2) - wall_thickness // Align the top of the cube with the top of the block.
                        ])
                            cube([curve_circle_length() / 2, overall_width, curve_circle_height() / 2 + wall_thickness]);

                       translate([0, 0, block_height * real_height])
                            translate([0, overall_width/2, 0]) // Center across the end of the block.
                            rotate([90, 0, 0])
                            translate([0, 0, -overall_width/2]) // z-center
                            difference() {
                                resize([curve_circle_length() + (wall_thickness * 2), curve_circle_height() + (wall_thickness * 2), 0]) // Resize to the final dimensions.
                                cylinder(r=block_height * real_height, h=overall_width, $fs=cylinder_precision);

                                translate([0, 0, -0.5]) // The inner cylinder is just a little taller, for nicer OpenSCAD previews.
                                    resize([curve_circle_length(), curve_circle_height(), 0]) // Resize to the final dimensions.
                                    cylinder(r=block_height * real_height, h=overall_width+1, $fs=cylinder_precision);
                            }
                    }
                }
            }
            else if (type == "round") {
                difference() {
                    union() {
                        translate([round_distance,                    round_distance,                 0])             rounded_corner_wall(real_rounding);
                        translate([overall_length - (round_distance), round_distance,                 0]) rotate(90)  rounded_corner_wall(real_rounding);
                        translate([overall_length - (round_distance), overall_width - round_distance, 0]) rotate(180) rounded_corner_wall(real_rounding);
                        translate([round_distance,                    overall_width - round_distance, 0]) rotate(270) rounded_corner_wall(real_rounding);
                    }
                if (real_stud_notches) {subtract_stud_notches();}
                }
            }
            
            if (real_dual_sided) {
                translate([overall_length/2, overall_width/2, block_height * height]) mirror([0,0,1]) block(
                    width=real_width,
                    length=real_length,
                    height=real_height,
                    type=type,
                    brand=brand,
                    stud_type=stud_type,
                    block_bottom_type=block_bottom_type,
                    include_wall_splines=include_wall_splines,
                    horizontal_holes=real_horizontal_holes,
                    vertical_axle_holes=real_vertical_axle_holes,
                    reinforcement=real_reinforcement,
                    wing_type=wing_type,
                    wing_end_width=real_wing_end_width,
                    wing_base_length=real_wing_base_length-1,
                    stud_notches=real_stud_notches,
                    slope_stud_rows=real_slope_stud_rows,
                    slope_end_height=real_slope_end_height,
                    curve_stud_rows=real_curve_stud_rows,
                    curve_type=real_curve_type,
                    curve_end_height=real_curve_end_height,
                    roadway_width=real_roadway_width,
                    roadway_length=real_roadway_length,
                    roadway_x=real_roadway_x,
                    roadway_y=real_roadway_y,
                    stud_rescale=stud_rescale,
                    stud_top_roundness=stud_top_roundness,
                    dual_sided=false
                );
            }

            if (real_dual_bottom) {
                translate([overall_length/2, overall_width/2, block_height * height * 2]) mirror([0,0,1]) block(
                    width=real_width,
                    length=real_length,
                    height=real_height,
                    type="tile",
                    brand=brand,
                    stud_type=stud_type,
                    block_bottom_type=block_bottom_type,
                    include_wall_splines=include_wall_splines,
                    horizontal_holes=real_horizontal_holes,
                    vertical_axle_holes=real_vertical_axle_holes,
                    reinforcement=real_reinforcement,
                    wing_type=wing_type,
                    wing_end_width=real_wing_end_width,
                    wing_base_length=real_wing_base_length-1,
                    stud_notches=real_stud_notches,
                    slope_stud_rows=real_slope_stud_rows,
                    slope_end_height=real_slope_end_height,
                    curve_stud_rows=real_curve_stud_rows,
                    curve_type=real_curve_type,
                    curve_end_height=real_curve_end_height,
                    roadway_width=real_roadway_width,
                    roadway_length=real_roadway_length,
                    roadway_x=real_roadway_x,
                    roadway_y=real_roadway_y,
                    stud_rescale=stud_rescale,
                    stud_top_roundness=stud_top_roundness,
                    dual_sided=false,
                    dual_bottom=false
                );
            }
    }

    module post(vertical_axle_hole) {
        difference() {
            cylinder(r=post_diameter/2, h=real_height*block_height,$fs=cylinder_precision);
            if (vertical_axle_hole==true) {
                translate([0,0,-block_height/2])
                    axle();
            } else {
                translate([0,0,-0.5]) cylinder(r=(post_diameter/2)-post_wall_thickness, h=real_height*block_height+1,$fs=cylinder_precision);
            }
        }
    }

    module reinforcement() {
        union() {
            translate([0,0,real_height*block_height/2]) union() {
                cube([reinforcing_width, 2 * (stud_spacing - (2 * wall_play)), real_height * block_height],center=true);
                rotate(v=[0,0,1],a=90) cube([reinforcing_width, 2 * (stud_spacing - (2 * wall_play)), real_height * block_height], center=true);
            }
        }
    }

    module axle() {
        translate([0,0,(real_height+1)*block_height/2]) union() {
            cube([axle_diameter,axle_spline_width,(real_height+1)*block_height],center=true);
            cube([axle_spline_width,axle_diameter,(real_height+1)*block_height],center=true);
        }
    }

    module stud() {
        stud_top_height=1;
        stud_body_height=(stud_top_roundness != 0) ? (stud_height - stud_top_height) : stud_height;
        difference() {
            union() {
                cylinder(r=(stud_diameter*stud_rescale)/2,h=stud_body_height,$fs=cylinder_precision);
                if (stud_top_roundness != 0) {
                    translate([0,0,stud_body_height])
                    rounded_stud_top(height=stud_top_height, radius=(stud_diameter*stud_rescale)/2,curve_height=stud_top_roundness);
                }
            }

            if (stud_type == "hollow") {
                // 0.5 is for cleaner preview; doesn't affect functionality.
                cylinder(r=(hollow_stud_inner_diameter*stud_rescale)/2,h=stud_height+0.5,$fs=cylinder_precision);
            }
        }
    }

    module rounded_stud_top(
        height,
        radius,
        curve_height
        ) {
        assert(curve_height < (radius/2), "Curve height must be less than half the radius");
        assert(height >= curve_height, "Curve height must be greater than or equal to height");
        base_height=height-curve_height;
        union() {
            cylinder(h=base_height, r=radius, $fs=cylinder_precision);
            translate([0,0,base_height])
            difference() {
                union() {
                    rotate_extrude($fs=cylinder_precision)
                    hull() {
                        translate([radius-curve_height, 0, 0])
                        circle(curve_height, $fs=cylinder_precision);
                    };
                    cylinder(h=curve_height, r=(radius-curve_height), $fs=cylinder_precision);
                }
                translate([0,0,-curve_height])
                cylinder(h=curve_height, r=(radius), $fs=cylinder_precision);
            }

        };
    }

    module subtract_stud_notches() {
        translate([overall_length/2, overall_width/2, -.001])
            translate([0, 0, -(1/3 * block_height)]) block(
                width=real_width,
                length=real_length,
                height=1/3,
                brand=brand,
                stud_type="solid",
                block_bottom_type=block_bottom_type,
                include_wall_splines=include_wall_splines,
                type="brick",
                stud_rescale=1.5,
                stud_top_roundness=stud_top_roundness
            );
    }
                        
    module rounded_corner_wall(round_radius) {
        difference() {
            rotate([0,0,180]) {
                rotate_extrude(angle=90) {
                    square([round_radius * stud_spacing,real_height * block_height]);
                }
            }
            translate([0,0,-.001])
            rotate([0,0,179]) {
                // just a little wider to avoid false surfaces
                rotate_extrude(angle=92) {
                    square([(round_radius * stud_spacing) - wall_thickness,(real_height * block_height)+ .001]);
                }
            }
        }
    }

    function curve_circle_length() = (overall_length - (stud_spacing * min(real_length - 1, real_curve_stud_rows)) + (wall_play/2)) * 2;
    function curve_circle_height() = (
            (
                (block_height * real_height) - (real_curve_end_height * block_height)) * 2) - (real_curve_type == "convex" ? (stud_height * 2) + (wall_thickness * 2) : 0);

    function wing_width(x_pos) = (real_width - width_loss(x_pos));

    function width_loss(x_pos) = (type != "wing" ? 0 :
        round((wing_type == "full" ?
            max(0, (2 * wing_slope * (x_pos - (real_wing_base_length - 1)))) + 0.3 // Full wing
            :
            max(0, (wing_slope * (x_pos - (real_wing_base_length - 1)))) + 0.2 // Half wing
        )) // +extra is because full studs can still fit on partially missing bases, but not by much
    );

    function horizontal_hole_start_index() = (
        (
            (type == "slope" && real_slope_stud_rows == 1)
            || (type == "curve" && real_curve_stud_rows == 1)
        )
        ?
        real_length - 1
        :
        0
    );
    function horizontal_hole_end_index() = (
        (
            real_length == 1
            || (type == "slope" && real_slope_stud_rows == 1)
            || (type == "curve" && real_curve_stud_rows == 1)
        )
        ?
        real_length - 1
        :
        real_length - 2
    );
    function skip_this_horizontal_hole(xcount, zcount) = (
        (type == "slope" && ((zcount >= slope_end_height) && (xcount <= real_length - real_slope_stud_rows - 1)))
        ||
        (type == "curve" && ((zcount >= curve_end_height) && (xcount <= real_length - real_curve_stud_rows - 1)))
    );

    function horizontal_holes_x_offset() = (
        (horizontal_hole_diameter / 2)
        + (
            (
                real_length == 1
                || (type == "slope" && real_slope_stud_rows == 1)
                || (type == "curve" && real_curve_stud_rows == 1)
            )
            ?
            0
            :
            (stud_spacing / 2)
        )
    );
    
    function put_vertical_axle_hole_here(xcount, ycount) = (
        !skip_this_axle_hole(xcount, ycount)
    );
    
    function skip_this_vertical_axle_hole(xcount, ycount) = (
        (type == "slope" && xcount < (real_length - real_slope_stud_rows + 1))
        ||
        (type == "curve" && xcount < (real_length - real_curve_stud_rows + 1))
        
    );
    
    // Ranges are zeron indexed
    function skip_this_stud(xcount, ycount) = (
        (type == "wing" && (
            (wing_type == "full" && ((ycount+1 <= ceil(width_loss(xcount+1)/2)) || (ycount+1 > floor(real_width - (width_loss(xcount+1)/2)))))
            || (wing_type == "left" && ycount+1 > wing_width(xcount+1))
            || (wing_type == "right" && ycount < width_loss(xcount+1))
            )
        )
        ||
        ( ! roadway_invert && real_roadway_width > 0 && real_roadway_length > 0 && pos_in_roadway(xcount, ycount))
        ||
        ( roadway_invert && real_roadway_width > 0 && real_roadway_length > 0 && !pos_in_roadway(xcount, ycount))
        ||
        (type == "round" && (
            ((xcount+1) * (ycount+1)) < real_rounding
            || ((real_length - xcount) * (ycount+1)) < real_rounding
            || ((real_length - xcount) * (real_width - ycount)) < real_rounding
            || ((xcount+1) * (real_width - ycount)) < real_rounding
        ))
    );

    function pos_in_roadway(x, y) = (
        x >= real_roadway_x
        && y >= real_roadway_y
        && y < real_roadway_y + real_roadway_width
        && x < real_roadway_x + real_roadway_length
    );
        
    
    module negative_rounded_corner(r,h,inside=false) {
        ir=inside ? r-wall_thickness : r;
        difference() {
            translate([0, 0, -.5]) cube([r+1, r+1, h+1]);
            translate([0, 0, -1]) cylinder(r=ir, h=h + 2, $fs=cylinder_precision);
        }
    }
}

module uncenter(
    width,
    length,
    height,
    stud_spacing=8,
    x_wall_play=0.1,
    y_wall_play=0.1,
    z_wall_play=0.1
    ) {
    translate([((stud_spacing * length) / 2) - x_wall_play, ((stud_spacing * width) / 2) - y_wall_play, height ? ((stud_spacing * height) / 2) - z_wall_play : 0]) children();
}

module place(x, y, z=0) {
    translate([8 * y, 8 * x, z * 9.6]) children();
}

module stack(x=0,y=0,z=0) {
    union() {
        place(x,y,z) {
            children();
        }
    }
}

function compute_real_height(type, height) = max((type == "baseplate" ? 1 : 1/3), height);

function compute_block_height(type, brand) = (brand == "lego" ? (type == "baseplate" ? 1.3 : 9.6) : 9.6 * 2);

function block_height(height_ratio=1, brand="lego", type="block") =
  let (
    real_height = compute_real_height(type, height_ratio),
    block_height = compute_block_height(type, brand)
  )
  (real_height * block_height);


function minimum_block_count(
    length=0,
    stud_spacing=8,
    wall_play=0.1
    ) = ceil((length/stud_spacing)-wall_play);

// translate([0,-5,-10]){cube(10);};
